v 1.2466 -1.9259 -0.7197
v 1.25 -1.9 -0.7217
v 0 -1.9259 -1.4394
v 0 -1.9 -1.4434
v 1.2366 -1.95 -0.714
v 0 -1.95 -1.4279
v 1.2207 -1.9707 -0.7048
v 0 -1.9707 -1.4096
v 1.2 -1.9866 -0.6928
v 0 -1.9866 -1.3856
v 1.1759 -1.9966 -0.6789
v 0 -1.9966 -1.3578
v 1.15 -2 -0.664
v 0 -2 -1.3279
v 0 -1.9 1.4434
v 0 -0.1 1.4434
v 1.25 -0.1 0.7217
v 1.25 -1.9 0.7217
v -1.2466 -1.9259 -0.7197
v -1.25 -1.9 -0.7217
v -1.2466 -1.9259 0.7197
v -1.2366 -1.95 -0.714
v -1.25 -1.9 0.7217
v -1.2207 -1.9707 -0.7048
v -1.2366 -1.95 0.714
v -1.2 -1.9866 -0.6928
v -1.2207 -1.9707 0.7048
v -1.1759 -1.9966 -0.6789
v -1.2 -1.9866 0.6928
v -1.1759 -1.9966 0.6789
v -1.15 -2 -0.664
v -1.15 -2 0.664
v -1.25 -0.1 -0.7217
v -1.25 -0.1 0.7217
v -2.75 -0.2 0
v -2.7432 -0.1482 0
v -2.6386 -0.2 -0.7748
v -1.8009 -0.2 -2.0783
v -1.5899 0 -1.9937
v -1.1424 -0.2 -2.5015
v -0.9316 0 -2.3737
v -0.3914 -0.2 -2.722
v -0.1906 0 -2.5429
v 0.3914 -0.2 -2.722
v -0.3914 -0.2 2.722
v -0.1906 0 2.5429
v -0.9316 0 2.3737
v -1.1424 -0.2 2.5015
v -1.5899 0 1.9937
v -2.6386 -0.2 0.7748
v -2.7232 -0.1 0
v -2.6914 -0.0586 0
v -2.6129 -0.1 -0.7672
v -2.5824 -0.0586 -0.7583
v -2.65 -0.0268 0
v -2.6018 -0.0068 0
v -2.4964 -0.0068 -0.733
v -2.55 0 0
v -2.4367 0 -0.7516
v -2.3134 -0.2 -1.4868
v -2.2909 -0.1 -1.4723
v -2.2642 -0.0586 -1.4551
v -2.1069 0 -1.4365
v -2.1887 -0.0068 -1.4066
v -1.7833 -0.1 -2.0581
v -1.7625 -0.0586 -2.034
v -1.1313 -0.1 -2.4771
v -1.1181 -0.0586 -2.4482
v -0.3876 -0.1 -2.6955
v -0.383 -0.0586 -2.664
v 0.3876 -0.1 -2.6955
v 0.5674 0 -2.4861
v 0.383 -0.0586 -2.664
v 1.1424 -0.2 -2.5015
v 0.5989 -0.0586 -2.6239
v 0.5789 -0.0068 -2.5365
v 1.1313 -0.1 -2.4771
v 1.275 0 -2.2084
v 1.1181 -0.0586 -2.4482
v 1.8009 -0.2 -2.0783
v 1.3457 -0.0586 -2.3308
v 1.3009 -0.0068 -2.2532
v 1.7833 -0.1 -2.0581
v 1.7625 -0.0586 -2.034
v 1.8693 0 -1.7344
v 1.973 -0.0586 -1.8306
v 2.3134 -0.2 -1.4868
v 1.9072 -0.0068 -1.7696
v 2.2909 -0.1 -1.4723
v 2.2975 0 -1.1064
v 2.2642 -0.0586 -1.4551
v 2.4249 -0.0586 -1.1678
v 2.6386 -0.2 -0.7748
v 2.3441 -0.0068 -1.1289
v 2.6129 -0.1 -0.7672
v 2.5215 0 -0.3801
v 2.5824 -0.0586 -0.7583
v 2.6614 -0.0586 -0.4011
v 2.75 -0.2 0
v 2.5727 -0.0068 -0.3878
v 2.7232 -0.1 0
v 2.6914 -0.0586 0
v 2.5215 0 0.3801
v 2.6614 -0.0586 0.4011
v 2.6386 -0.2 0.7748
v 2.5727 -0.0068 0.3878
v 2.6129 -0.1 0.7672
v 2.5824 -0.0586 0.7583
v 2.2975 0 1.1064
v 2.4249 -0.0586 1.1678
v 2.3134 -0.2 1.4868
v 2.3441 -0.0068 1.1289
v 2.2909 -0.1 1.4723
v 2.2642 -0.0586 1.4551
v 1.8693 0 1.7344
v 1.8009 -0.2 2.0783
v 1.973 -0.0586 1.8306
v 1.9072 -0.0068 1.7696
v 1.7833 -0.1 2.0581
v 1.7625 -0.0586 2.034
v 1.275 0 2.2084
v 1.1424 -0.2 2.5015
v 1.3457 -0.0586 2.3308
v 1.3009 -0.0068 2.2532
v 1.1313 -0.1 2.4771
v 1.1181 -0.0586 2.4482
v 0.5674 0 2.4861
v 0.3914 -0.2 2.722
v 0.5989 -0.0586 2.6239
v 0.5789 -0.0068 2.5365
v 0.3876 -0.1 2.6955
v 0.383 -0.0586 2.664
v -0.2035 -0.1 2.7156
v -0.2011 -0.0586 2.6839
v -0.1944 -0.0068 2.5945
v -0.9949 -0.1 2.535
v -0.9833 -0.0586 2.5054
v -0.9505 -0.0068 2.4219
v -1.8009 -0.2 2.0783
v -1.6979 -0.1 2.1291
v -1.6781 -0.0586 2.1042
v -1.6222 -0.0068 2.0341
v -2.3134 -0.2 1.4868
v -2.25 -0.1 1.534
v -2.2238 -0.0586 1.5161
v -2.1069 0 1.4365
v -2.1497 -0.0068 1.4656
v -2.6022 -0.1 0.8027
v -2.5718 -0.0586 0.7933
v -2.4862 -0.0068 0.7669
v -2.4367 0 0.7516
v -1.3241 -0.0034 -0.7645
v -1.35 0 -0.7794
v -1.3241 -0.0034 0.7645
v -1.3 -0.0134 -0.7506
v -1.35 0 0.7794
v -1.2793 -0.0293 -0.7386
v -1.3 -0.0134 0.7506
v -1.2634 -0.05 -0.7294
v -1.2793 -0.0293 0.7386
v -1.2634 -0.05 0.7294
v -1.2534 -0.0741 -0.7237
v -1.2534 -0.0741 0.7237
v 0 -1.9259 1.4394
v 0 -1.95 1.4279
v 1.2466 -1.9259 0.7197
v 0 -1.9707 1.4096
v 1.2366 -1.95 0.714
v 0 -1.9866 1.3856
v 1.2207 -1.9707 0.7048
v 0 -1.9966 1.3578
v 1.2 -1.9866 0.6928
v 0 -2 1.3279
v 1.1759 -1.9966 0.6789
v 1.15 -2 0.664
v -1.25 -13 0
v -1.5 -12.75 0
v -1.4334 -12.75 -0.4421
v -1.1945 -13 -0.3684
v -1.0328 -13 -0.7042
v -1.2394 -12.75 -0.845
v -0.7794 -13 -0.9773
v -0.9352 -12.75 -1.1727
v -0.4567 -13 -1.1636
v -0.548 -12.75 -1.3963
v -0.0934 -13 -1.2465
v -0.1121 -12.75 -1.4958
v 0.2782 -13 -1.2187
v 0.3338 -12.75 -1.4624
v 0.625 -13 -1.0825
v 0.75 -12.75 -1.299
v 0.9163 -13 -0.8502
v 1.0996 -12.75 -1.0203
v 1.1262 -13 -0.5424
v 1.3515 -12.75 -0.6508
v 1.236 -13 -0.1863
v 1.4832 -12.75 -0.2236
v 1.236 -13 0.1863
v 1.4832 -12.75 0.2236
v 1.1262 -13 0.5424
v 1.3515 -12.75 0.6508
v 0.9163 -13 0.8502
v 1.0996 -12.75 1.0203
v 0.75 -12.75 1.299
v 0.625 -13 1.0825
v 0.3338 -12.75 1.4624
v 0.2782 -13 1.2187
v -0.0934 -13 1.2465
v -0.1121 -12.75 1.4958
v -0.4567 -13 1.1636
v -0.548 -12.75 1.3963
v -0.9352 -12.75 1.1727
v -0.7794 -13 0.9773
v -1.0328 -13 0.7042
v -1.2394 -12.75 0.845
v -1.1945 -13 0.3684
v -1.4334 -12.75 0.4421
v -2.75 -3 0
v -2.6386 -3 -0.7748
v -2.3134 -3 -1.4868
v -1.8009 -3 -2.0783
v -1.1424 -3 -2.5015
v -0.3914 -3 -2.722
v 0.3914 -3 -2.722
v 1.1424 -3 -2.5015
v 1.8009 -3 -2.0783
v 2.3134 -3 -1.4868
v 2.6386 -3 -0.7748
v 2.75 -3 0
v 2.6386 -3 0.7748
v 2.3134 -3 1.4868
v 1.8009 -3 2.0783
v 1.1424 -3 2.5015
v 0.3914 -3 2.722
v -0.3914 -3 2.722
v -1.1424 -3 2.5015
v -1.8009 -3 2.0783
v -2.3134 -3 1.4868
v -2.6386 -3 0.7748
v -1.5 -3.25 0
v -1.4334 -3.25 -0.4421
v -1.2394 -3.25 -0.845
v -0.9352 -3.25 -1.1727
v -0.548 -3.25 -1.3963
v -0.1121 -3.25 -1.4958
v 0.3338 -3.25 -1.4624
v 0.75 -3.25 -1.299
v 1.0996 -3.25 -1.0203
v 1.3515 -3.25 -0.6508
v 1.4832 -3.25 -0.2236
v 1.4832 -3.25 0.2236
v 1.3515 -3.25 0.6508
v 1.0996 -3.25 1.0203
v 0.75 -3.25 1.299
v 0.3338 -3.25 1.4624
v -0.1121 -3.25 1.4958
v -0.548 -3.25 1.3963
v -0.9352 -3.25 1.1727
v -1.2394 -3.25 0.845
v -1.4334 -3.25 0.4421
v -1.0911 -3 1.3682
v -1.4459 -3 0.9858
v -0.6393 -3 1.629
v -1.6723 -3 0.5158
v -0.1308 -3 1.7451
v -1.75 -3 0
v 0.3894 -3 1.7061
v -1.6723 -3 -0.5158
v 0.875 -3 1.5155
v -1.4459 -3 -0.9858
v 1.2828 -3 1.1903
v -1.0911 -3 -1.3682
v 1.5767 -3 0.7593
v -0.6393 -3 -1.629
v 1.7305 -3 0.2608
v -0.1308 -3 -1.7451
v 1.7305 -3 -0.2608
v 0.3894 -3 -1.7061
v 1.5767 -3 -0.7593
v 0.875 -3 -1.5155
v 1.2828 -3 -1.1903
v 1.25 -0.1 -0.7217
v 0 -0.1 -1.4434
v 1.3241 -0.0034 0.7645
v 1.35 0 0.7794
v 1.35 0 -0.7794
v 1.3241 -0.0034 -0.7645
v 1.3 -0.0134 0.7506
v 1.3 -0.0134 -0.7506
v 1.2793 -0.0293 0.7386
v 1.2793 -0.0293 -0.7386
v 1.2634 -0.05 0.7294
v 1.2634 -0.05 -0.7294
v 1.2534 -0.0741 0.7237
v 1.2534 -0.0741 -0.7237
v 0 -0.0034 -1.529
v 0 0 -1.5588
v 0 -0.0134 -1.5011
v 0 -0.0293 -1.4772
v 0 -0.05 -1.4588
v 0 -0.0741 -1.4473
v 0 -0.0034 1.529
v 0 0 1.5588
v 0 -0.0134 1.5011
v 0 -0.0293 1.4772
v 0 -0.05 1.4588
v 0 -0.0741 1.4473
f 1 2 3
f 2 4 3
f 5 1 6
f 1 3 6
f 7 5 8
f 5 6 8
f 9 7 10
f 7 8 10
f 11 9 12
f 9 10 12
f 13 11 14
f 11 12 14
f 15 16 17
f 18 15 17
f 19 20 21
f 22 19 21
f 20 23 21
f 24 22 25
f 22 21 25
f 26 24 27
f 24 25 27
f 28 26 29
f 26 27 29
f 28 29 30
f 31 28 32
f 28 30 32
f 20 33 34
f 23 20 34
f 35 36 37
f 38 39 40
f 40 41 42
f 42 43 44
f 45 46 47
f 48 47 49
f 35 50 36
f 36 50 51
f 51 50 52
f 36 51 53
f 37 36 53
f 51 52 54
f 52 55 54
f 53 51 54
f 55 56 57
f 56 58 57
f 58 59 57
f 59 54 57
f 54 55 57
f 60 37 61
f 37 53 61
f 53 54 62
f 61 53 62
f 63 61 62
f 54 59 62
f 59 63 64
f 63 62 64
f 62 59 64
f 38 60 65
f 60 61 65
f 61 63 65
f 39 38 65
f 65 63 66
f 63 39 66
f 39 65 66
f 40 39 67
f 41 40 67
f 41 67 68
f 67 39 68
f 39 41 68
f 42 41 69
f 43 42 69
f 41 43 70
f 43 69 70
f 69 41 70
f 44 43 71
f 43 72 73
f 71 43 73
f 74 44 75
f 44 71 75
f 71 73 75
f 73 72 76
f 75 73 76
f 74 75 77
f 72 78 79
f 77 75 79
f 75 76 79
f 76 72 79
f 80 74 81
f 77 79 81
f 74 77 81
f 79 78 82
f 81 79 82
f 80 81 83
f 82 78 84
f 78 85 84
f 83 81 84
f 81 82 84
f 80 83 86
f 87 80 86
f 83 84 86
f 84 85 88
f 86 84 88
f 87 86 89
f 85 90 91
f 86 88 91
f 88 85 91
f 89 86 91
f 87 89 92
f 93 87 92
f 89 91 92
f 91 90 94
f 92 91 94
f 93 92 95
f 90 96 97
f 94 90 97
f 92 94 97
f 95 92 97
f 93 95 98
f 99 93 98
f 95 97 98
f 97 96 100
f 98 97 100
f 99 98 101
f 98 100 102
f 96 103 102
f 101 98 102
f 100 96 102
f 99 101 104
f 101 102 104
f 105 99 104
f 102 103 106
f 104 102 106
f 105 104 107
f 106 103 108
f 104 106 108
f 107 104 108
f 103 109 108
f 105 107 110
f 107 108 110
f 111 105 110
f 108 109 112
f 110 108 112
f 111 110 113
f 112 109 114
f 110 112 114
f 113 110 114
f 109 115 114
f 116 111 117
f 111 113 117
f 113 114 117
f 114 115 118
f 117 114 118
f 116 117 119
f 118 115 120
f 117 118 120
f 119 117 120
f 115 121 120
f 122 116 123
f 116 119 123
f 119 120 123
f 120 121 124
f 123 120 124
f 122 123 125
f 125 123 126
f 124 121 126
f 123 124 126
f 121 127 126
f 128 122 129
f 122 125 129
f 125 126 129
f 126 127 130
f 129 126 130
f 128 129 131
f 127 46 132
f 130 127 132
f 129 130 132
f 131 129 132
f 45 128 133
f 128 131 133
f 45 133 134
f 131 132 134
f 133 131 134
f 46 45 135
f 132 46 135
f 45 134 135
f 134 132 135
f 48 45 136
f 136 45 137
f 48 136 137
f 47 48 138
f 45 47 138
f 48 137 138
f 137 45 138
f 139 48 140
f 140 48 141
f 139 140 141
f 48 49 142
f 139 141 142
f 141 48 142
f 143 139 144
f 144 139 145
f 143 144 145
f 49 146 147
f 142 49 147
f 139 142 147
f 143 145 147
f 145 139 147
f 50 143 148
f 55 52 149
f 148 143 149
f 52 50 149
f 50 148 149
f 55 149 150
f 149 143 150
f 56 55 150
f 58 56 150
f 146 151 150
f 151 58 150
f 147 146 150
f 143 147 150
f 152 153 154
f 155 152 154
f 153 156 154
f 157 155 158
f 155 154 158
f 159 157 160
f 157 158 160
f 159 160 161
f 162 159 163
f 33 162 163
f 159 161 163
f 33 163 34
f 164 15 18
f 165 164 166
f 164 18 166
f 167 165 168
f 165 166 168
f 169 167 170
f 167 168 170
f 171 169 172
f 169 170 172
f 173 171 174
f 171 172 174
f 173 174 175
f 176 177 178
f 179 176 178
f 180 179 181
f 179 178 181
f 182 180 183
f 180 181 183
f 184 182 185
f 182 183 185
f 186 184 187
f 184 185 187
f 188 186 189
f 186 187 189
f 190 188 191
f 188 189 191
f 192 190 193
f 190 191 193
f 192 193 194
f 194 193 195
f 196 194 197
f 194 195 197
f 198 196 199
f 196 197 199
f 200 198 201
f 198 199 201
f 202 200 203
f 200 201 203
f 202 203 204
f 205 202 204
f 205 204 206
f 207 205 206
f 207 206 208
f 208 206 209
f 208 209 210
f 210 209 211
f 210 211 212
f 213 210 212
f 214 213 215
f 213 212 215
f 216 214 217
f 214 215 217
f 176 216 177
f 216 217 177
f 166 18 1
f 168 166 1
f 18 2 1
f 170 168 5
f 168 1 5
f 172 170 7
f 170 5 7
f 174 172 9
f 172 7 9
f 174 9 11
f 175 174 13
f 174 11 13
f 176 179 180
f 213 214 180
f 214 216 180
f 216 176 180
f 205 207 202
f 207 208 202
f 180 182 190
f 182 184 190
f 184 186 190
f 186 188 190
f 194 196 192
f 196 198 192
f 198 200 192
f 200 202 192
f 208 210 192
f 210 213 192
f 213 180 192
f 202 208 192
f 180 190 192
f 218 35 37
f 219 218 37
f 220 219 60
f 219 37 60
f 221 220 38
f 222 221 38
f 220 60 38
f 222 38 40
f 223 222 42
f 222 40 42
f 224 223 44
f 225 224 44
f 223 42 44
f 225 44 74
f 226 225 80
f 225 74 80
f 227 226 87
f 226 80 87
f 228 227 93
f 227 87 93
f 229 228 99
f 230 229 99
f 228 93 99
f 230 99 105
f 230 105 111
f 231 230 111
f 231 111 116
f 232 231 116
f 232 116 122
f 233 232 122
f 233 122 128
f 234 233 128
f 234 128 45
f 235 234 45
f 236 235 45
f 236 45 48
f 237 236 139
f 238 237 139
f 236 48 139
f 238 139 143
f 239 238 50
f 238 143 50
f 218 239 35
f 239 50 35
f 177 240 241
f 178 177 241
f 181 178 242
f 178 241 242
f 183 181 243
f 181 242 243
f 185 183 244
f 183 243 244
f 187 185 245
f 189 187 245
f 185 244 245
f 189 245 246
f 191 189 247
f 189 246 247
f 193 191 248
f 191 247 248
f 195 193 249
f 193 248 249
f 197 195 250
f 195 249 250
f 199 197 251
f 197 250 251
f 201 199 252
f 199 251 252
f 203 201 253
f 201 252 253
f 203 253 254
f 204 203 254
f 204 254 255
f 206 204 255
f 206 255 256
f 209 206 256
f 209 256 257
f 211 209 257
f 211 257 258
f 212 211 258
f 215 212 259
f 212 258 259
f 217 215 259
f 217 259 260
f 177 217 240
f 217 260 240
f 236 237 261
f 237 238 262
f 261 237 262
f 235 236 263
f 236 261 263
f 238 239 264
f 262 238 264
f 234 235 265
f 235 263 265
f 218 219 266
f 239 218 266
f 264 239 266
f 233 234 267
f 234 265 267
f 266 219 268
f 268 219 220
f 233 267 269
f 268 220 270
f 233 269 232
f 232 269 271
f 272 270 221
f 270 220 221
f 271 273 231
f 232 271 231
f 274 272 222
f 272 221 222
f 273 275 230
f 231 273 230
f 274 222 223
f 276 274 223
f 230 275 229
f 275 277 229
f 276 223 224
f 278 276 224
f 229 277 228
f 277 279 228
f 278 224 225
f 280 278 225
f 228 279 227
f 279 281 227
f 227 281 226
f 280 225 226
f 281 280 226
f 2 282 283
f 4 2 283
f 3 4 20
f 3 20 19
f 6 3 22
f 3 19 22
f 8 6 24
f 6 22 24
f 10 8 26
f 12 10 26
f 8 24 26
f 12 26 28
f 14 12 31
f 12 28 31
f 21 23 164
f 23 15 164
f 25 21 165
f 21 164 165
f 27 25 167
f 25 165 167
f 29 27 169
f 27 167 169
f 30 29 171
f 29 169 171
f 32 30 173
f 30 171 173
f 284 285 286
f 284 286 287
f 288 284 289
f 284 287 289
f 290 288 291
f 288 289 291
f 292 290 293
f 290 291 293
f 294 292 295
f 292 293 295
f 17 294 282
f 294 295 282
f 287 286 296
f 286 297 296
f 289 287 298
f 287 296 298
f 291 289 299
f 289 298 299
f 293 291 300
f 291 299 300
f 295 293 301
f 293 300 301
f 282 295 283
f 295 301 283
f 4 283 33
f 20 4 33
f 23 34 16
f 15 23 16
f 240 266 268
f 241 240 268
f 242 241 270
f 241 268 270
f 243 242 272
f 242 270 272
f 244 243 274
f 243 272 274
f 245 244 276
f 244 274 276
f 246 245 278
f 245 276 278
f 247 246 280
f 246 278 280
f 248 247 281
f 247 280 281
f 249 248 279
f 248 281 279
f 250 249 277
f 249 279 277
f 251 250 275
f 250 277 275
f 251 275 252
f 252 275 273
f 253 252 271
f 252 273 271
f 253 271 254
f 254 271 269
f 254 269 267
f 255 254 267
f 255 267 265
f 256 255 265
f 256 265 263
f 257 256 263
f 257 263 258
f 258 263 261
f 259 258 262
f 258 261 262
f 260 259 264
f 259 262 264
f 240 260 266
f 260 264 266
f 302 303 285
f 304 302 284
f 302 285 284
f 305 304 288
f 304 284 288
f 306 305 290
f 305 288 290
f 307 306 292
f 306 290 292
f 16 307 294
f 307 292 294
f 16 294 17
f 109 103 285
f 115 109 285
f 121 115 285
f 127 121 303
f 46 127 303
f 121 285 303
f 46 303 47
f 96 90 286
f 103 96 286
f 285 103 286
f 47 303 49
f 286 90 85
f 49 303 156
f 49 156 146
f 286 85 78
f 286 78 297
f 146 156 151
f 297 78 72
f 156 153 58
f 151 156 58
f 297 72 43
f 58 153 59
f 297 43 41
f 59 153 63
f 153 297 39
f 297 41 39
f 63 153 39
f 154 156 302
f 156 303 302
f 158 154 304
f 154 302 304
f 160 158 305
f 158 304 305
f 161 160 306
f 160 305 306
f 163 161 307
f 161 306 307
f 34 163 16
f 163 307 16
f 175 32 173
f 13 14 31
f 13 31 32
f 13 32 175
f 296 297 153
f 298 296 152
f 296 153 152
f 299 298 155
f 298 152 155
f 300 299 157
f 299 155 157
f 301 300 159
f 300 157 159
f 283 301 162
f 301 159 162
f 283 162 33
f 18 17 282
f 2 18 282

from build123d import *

# Parameters (mm, degrees)
CHAMFER1_SIZE      = 0.25
FILLET1_R          = 0.2
CUT_EXTRUDE1_DEPTH = 2
FILLET2_R          = 0.1


with BuildPart() as part:
    # Sketch1 → Revolve1 (revolve)
    with BuildSketch(Plane.XY):
        Polygon((0, -13), (-1.5, -13), (-1.5, -3), (-2.75, -3), (-2.75, 0), (0, 0), align=None)
    revolve(axis=Axis((0, 0, 0), (0, -1, 0)))

    # Chamfer1
    chamfer1_edges = [part.edges().sort_by_distance(p)[0] for p in [
        (1.5, -3, 0),
        (1.5, -13, 0),
    ]]
    chamfer(chamfer1_edges, length=CHAMFER1_SIZE)

    # Fillet1
    fillet1_edges = [part.edges().sort_by_distance(p)[0] for p in [
        (2.75, 0, 0),
    ]]
    fillet(fillet1_edges, radius=FILLET1_R)

    # Sketch2 → Cut-Extrude1 (cut)
    with BuildSketch(Plane(origin=(0, 0, 0), x_dir=(1, 0, 0), z_dir=(0, 1, 0))):
        Polygon((0, 1.443375673), (-1.25, 0.721687836), (-1.25, -0.721687836), (0, -1.443375673), (1.25, -0.721687836), (1.25, 0.721687836), align=None)
    extrude(amount=-CUT_EXTRUDE1_DEPTH, mode=Mode.SUBTRACT)

    # Fillet2
    fillet2_edges = [part.edges().sort_by_distance(p)[0] for p in [
        (0.625, -2, -1.082531755),
        (1.25, -2, 0),
        (0.625, -2, 1.082531755),
        (-0.625, -2, 1.082531755),
        (-1.25, -2, 0),
        (-0.625, -2, -1.082531755),
        (0.625, 0, -1.082531755),
        (-0.625, 0, -1.082531755),
        (-1.25, 0, 0),
        (-0.625, 0, 1.082531755),
        (0.625, 0, 1.082531755),
        (1.25, 0, 0),
    ]]
    fillet(fillet2_edges, radius=FILLET2_R)


solid = part.part
